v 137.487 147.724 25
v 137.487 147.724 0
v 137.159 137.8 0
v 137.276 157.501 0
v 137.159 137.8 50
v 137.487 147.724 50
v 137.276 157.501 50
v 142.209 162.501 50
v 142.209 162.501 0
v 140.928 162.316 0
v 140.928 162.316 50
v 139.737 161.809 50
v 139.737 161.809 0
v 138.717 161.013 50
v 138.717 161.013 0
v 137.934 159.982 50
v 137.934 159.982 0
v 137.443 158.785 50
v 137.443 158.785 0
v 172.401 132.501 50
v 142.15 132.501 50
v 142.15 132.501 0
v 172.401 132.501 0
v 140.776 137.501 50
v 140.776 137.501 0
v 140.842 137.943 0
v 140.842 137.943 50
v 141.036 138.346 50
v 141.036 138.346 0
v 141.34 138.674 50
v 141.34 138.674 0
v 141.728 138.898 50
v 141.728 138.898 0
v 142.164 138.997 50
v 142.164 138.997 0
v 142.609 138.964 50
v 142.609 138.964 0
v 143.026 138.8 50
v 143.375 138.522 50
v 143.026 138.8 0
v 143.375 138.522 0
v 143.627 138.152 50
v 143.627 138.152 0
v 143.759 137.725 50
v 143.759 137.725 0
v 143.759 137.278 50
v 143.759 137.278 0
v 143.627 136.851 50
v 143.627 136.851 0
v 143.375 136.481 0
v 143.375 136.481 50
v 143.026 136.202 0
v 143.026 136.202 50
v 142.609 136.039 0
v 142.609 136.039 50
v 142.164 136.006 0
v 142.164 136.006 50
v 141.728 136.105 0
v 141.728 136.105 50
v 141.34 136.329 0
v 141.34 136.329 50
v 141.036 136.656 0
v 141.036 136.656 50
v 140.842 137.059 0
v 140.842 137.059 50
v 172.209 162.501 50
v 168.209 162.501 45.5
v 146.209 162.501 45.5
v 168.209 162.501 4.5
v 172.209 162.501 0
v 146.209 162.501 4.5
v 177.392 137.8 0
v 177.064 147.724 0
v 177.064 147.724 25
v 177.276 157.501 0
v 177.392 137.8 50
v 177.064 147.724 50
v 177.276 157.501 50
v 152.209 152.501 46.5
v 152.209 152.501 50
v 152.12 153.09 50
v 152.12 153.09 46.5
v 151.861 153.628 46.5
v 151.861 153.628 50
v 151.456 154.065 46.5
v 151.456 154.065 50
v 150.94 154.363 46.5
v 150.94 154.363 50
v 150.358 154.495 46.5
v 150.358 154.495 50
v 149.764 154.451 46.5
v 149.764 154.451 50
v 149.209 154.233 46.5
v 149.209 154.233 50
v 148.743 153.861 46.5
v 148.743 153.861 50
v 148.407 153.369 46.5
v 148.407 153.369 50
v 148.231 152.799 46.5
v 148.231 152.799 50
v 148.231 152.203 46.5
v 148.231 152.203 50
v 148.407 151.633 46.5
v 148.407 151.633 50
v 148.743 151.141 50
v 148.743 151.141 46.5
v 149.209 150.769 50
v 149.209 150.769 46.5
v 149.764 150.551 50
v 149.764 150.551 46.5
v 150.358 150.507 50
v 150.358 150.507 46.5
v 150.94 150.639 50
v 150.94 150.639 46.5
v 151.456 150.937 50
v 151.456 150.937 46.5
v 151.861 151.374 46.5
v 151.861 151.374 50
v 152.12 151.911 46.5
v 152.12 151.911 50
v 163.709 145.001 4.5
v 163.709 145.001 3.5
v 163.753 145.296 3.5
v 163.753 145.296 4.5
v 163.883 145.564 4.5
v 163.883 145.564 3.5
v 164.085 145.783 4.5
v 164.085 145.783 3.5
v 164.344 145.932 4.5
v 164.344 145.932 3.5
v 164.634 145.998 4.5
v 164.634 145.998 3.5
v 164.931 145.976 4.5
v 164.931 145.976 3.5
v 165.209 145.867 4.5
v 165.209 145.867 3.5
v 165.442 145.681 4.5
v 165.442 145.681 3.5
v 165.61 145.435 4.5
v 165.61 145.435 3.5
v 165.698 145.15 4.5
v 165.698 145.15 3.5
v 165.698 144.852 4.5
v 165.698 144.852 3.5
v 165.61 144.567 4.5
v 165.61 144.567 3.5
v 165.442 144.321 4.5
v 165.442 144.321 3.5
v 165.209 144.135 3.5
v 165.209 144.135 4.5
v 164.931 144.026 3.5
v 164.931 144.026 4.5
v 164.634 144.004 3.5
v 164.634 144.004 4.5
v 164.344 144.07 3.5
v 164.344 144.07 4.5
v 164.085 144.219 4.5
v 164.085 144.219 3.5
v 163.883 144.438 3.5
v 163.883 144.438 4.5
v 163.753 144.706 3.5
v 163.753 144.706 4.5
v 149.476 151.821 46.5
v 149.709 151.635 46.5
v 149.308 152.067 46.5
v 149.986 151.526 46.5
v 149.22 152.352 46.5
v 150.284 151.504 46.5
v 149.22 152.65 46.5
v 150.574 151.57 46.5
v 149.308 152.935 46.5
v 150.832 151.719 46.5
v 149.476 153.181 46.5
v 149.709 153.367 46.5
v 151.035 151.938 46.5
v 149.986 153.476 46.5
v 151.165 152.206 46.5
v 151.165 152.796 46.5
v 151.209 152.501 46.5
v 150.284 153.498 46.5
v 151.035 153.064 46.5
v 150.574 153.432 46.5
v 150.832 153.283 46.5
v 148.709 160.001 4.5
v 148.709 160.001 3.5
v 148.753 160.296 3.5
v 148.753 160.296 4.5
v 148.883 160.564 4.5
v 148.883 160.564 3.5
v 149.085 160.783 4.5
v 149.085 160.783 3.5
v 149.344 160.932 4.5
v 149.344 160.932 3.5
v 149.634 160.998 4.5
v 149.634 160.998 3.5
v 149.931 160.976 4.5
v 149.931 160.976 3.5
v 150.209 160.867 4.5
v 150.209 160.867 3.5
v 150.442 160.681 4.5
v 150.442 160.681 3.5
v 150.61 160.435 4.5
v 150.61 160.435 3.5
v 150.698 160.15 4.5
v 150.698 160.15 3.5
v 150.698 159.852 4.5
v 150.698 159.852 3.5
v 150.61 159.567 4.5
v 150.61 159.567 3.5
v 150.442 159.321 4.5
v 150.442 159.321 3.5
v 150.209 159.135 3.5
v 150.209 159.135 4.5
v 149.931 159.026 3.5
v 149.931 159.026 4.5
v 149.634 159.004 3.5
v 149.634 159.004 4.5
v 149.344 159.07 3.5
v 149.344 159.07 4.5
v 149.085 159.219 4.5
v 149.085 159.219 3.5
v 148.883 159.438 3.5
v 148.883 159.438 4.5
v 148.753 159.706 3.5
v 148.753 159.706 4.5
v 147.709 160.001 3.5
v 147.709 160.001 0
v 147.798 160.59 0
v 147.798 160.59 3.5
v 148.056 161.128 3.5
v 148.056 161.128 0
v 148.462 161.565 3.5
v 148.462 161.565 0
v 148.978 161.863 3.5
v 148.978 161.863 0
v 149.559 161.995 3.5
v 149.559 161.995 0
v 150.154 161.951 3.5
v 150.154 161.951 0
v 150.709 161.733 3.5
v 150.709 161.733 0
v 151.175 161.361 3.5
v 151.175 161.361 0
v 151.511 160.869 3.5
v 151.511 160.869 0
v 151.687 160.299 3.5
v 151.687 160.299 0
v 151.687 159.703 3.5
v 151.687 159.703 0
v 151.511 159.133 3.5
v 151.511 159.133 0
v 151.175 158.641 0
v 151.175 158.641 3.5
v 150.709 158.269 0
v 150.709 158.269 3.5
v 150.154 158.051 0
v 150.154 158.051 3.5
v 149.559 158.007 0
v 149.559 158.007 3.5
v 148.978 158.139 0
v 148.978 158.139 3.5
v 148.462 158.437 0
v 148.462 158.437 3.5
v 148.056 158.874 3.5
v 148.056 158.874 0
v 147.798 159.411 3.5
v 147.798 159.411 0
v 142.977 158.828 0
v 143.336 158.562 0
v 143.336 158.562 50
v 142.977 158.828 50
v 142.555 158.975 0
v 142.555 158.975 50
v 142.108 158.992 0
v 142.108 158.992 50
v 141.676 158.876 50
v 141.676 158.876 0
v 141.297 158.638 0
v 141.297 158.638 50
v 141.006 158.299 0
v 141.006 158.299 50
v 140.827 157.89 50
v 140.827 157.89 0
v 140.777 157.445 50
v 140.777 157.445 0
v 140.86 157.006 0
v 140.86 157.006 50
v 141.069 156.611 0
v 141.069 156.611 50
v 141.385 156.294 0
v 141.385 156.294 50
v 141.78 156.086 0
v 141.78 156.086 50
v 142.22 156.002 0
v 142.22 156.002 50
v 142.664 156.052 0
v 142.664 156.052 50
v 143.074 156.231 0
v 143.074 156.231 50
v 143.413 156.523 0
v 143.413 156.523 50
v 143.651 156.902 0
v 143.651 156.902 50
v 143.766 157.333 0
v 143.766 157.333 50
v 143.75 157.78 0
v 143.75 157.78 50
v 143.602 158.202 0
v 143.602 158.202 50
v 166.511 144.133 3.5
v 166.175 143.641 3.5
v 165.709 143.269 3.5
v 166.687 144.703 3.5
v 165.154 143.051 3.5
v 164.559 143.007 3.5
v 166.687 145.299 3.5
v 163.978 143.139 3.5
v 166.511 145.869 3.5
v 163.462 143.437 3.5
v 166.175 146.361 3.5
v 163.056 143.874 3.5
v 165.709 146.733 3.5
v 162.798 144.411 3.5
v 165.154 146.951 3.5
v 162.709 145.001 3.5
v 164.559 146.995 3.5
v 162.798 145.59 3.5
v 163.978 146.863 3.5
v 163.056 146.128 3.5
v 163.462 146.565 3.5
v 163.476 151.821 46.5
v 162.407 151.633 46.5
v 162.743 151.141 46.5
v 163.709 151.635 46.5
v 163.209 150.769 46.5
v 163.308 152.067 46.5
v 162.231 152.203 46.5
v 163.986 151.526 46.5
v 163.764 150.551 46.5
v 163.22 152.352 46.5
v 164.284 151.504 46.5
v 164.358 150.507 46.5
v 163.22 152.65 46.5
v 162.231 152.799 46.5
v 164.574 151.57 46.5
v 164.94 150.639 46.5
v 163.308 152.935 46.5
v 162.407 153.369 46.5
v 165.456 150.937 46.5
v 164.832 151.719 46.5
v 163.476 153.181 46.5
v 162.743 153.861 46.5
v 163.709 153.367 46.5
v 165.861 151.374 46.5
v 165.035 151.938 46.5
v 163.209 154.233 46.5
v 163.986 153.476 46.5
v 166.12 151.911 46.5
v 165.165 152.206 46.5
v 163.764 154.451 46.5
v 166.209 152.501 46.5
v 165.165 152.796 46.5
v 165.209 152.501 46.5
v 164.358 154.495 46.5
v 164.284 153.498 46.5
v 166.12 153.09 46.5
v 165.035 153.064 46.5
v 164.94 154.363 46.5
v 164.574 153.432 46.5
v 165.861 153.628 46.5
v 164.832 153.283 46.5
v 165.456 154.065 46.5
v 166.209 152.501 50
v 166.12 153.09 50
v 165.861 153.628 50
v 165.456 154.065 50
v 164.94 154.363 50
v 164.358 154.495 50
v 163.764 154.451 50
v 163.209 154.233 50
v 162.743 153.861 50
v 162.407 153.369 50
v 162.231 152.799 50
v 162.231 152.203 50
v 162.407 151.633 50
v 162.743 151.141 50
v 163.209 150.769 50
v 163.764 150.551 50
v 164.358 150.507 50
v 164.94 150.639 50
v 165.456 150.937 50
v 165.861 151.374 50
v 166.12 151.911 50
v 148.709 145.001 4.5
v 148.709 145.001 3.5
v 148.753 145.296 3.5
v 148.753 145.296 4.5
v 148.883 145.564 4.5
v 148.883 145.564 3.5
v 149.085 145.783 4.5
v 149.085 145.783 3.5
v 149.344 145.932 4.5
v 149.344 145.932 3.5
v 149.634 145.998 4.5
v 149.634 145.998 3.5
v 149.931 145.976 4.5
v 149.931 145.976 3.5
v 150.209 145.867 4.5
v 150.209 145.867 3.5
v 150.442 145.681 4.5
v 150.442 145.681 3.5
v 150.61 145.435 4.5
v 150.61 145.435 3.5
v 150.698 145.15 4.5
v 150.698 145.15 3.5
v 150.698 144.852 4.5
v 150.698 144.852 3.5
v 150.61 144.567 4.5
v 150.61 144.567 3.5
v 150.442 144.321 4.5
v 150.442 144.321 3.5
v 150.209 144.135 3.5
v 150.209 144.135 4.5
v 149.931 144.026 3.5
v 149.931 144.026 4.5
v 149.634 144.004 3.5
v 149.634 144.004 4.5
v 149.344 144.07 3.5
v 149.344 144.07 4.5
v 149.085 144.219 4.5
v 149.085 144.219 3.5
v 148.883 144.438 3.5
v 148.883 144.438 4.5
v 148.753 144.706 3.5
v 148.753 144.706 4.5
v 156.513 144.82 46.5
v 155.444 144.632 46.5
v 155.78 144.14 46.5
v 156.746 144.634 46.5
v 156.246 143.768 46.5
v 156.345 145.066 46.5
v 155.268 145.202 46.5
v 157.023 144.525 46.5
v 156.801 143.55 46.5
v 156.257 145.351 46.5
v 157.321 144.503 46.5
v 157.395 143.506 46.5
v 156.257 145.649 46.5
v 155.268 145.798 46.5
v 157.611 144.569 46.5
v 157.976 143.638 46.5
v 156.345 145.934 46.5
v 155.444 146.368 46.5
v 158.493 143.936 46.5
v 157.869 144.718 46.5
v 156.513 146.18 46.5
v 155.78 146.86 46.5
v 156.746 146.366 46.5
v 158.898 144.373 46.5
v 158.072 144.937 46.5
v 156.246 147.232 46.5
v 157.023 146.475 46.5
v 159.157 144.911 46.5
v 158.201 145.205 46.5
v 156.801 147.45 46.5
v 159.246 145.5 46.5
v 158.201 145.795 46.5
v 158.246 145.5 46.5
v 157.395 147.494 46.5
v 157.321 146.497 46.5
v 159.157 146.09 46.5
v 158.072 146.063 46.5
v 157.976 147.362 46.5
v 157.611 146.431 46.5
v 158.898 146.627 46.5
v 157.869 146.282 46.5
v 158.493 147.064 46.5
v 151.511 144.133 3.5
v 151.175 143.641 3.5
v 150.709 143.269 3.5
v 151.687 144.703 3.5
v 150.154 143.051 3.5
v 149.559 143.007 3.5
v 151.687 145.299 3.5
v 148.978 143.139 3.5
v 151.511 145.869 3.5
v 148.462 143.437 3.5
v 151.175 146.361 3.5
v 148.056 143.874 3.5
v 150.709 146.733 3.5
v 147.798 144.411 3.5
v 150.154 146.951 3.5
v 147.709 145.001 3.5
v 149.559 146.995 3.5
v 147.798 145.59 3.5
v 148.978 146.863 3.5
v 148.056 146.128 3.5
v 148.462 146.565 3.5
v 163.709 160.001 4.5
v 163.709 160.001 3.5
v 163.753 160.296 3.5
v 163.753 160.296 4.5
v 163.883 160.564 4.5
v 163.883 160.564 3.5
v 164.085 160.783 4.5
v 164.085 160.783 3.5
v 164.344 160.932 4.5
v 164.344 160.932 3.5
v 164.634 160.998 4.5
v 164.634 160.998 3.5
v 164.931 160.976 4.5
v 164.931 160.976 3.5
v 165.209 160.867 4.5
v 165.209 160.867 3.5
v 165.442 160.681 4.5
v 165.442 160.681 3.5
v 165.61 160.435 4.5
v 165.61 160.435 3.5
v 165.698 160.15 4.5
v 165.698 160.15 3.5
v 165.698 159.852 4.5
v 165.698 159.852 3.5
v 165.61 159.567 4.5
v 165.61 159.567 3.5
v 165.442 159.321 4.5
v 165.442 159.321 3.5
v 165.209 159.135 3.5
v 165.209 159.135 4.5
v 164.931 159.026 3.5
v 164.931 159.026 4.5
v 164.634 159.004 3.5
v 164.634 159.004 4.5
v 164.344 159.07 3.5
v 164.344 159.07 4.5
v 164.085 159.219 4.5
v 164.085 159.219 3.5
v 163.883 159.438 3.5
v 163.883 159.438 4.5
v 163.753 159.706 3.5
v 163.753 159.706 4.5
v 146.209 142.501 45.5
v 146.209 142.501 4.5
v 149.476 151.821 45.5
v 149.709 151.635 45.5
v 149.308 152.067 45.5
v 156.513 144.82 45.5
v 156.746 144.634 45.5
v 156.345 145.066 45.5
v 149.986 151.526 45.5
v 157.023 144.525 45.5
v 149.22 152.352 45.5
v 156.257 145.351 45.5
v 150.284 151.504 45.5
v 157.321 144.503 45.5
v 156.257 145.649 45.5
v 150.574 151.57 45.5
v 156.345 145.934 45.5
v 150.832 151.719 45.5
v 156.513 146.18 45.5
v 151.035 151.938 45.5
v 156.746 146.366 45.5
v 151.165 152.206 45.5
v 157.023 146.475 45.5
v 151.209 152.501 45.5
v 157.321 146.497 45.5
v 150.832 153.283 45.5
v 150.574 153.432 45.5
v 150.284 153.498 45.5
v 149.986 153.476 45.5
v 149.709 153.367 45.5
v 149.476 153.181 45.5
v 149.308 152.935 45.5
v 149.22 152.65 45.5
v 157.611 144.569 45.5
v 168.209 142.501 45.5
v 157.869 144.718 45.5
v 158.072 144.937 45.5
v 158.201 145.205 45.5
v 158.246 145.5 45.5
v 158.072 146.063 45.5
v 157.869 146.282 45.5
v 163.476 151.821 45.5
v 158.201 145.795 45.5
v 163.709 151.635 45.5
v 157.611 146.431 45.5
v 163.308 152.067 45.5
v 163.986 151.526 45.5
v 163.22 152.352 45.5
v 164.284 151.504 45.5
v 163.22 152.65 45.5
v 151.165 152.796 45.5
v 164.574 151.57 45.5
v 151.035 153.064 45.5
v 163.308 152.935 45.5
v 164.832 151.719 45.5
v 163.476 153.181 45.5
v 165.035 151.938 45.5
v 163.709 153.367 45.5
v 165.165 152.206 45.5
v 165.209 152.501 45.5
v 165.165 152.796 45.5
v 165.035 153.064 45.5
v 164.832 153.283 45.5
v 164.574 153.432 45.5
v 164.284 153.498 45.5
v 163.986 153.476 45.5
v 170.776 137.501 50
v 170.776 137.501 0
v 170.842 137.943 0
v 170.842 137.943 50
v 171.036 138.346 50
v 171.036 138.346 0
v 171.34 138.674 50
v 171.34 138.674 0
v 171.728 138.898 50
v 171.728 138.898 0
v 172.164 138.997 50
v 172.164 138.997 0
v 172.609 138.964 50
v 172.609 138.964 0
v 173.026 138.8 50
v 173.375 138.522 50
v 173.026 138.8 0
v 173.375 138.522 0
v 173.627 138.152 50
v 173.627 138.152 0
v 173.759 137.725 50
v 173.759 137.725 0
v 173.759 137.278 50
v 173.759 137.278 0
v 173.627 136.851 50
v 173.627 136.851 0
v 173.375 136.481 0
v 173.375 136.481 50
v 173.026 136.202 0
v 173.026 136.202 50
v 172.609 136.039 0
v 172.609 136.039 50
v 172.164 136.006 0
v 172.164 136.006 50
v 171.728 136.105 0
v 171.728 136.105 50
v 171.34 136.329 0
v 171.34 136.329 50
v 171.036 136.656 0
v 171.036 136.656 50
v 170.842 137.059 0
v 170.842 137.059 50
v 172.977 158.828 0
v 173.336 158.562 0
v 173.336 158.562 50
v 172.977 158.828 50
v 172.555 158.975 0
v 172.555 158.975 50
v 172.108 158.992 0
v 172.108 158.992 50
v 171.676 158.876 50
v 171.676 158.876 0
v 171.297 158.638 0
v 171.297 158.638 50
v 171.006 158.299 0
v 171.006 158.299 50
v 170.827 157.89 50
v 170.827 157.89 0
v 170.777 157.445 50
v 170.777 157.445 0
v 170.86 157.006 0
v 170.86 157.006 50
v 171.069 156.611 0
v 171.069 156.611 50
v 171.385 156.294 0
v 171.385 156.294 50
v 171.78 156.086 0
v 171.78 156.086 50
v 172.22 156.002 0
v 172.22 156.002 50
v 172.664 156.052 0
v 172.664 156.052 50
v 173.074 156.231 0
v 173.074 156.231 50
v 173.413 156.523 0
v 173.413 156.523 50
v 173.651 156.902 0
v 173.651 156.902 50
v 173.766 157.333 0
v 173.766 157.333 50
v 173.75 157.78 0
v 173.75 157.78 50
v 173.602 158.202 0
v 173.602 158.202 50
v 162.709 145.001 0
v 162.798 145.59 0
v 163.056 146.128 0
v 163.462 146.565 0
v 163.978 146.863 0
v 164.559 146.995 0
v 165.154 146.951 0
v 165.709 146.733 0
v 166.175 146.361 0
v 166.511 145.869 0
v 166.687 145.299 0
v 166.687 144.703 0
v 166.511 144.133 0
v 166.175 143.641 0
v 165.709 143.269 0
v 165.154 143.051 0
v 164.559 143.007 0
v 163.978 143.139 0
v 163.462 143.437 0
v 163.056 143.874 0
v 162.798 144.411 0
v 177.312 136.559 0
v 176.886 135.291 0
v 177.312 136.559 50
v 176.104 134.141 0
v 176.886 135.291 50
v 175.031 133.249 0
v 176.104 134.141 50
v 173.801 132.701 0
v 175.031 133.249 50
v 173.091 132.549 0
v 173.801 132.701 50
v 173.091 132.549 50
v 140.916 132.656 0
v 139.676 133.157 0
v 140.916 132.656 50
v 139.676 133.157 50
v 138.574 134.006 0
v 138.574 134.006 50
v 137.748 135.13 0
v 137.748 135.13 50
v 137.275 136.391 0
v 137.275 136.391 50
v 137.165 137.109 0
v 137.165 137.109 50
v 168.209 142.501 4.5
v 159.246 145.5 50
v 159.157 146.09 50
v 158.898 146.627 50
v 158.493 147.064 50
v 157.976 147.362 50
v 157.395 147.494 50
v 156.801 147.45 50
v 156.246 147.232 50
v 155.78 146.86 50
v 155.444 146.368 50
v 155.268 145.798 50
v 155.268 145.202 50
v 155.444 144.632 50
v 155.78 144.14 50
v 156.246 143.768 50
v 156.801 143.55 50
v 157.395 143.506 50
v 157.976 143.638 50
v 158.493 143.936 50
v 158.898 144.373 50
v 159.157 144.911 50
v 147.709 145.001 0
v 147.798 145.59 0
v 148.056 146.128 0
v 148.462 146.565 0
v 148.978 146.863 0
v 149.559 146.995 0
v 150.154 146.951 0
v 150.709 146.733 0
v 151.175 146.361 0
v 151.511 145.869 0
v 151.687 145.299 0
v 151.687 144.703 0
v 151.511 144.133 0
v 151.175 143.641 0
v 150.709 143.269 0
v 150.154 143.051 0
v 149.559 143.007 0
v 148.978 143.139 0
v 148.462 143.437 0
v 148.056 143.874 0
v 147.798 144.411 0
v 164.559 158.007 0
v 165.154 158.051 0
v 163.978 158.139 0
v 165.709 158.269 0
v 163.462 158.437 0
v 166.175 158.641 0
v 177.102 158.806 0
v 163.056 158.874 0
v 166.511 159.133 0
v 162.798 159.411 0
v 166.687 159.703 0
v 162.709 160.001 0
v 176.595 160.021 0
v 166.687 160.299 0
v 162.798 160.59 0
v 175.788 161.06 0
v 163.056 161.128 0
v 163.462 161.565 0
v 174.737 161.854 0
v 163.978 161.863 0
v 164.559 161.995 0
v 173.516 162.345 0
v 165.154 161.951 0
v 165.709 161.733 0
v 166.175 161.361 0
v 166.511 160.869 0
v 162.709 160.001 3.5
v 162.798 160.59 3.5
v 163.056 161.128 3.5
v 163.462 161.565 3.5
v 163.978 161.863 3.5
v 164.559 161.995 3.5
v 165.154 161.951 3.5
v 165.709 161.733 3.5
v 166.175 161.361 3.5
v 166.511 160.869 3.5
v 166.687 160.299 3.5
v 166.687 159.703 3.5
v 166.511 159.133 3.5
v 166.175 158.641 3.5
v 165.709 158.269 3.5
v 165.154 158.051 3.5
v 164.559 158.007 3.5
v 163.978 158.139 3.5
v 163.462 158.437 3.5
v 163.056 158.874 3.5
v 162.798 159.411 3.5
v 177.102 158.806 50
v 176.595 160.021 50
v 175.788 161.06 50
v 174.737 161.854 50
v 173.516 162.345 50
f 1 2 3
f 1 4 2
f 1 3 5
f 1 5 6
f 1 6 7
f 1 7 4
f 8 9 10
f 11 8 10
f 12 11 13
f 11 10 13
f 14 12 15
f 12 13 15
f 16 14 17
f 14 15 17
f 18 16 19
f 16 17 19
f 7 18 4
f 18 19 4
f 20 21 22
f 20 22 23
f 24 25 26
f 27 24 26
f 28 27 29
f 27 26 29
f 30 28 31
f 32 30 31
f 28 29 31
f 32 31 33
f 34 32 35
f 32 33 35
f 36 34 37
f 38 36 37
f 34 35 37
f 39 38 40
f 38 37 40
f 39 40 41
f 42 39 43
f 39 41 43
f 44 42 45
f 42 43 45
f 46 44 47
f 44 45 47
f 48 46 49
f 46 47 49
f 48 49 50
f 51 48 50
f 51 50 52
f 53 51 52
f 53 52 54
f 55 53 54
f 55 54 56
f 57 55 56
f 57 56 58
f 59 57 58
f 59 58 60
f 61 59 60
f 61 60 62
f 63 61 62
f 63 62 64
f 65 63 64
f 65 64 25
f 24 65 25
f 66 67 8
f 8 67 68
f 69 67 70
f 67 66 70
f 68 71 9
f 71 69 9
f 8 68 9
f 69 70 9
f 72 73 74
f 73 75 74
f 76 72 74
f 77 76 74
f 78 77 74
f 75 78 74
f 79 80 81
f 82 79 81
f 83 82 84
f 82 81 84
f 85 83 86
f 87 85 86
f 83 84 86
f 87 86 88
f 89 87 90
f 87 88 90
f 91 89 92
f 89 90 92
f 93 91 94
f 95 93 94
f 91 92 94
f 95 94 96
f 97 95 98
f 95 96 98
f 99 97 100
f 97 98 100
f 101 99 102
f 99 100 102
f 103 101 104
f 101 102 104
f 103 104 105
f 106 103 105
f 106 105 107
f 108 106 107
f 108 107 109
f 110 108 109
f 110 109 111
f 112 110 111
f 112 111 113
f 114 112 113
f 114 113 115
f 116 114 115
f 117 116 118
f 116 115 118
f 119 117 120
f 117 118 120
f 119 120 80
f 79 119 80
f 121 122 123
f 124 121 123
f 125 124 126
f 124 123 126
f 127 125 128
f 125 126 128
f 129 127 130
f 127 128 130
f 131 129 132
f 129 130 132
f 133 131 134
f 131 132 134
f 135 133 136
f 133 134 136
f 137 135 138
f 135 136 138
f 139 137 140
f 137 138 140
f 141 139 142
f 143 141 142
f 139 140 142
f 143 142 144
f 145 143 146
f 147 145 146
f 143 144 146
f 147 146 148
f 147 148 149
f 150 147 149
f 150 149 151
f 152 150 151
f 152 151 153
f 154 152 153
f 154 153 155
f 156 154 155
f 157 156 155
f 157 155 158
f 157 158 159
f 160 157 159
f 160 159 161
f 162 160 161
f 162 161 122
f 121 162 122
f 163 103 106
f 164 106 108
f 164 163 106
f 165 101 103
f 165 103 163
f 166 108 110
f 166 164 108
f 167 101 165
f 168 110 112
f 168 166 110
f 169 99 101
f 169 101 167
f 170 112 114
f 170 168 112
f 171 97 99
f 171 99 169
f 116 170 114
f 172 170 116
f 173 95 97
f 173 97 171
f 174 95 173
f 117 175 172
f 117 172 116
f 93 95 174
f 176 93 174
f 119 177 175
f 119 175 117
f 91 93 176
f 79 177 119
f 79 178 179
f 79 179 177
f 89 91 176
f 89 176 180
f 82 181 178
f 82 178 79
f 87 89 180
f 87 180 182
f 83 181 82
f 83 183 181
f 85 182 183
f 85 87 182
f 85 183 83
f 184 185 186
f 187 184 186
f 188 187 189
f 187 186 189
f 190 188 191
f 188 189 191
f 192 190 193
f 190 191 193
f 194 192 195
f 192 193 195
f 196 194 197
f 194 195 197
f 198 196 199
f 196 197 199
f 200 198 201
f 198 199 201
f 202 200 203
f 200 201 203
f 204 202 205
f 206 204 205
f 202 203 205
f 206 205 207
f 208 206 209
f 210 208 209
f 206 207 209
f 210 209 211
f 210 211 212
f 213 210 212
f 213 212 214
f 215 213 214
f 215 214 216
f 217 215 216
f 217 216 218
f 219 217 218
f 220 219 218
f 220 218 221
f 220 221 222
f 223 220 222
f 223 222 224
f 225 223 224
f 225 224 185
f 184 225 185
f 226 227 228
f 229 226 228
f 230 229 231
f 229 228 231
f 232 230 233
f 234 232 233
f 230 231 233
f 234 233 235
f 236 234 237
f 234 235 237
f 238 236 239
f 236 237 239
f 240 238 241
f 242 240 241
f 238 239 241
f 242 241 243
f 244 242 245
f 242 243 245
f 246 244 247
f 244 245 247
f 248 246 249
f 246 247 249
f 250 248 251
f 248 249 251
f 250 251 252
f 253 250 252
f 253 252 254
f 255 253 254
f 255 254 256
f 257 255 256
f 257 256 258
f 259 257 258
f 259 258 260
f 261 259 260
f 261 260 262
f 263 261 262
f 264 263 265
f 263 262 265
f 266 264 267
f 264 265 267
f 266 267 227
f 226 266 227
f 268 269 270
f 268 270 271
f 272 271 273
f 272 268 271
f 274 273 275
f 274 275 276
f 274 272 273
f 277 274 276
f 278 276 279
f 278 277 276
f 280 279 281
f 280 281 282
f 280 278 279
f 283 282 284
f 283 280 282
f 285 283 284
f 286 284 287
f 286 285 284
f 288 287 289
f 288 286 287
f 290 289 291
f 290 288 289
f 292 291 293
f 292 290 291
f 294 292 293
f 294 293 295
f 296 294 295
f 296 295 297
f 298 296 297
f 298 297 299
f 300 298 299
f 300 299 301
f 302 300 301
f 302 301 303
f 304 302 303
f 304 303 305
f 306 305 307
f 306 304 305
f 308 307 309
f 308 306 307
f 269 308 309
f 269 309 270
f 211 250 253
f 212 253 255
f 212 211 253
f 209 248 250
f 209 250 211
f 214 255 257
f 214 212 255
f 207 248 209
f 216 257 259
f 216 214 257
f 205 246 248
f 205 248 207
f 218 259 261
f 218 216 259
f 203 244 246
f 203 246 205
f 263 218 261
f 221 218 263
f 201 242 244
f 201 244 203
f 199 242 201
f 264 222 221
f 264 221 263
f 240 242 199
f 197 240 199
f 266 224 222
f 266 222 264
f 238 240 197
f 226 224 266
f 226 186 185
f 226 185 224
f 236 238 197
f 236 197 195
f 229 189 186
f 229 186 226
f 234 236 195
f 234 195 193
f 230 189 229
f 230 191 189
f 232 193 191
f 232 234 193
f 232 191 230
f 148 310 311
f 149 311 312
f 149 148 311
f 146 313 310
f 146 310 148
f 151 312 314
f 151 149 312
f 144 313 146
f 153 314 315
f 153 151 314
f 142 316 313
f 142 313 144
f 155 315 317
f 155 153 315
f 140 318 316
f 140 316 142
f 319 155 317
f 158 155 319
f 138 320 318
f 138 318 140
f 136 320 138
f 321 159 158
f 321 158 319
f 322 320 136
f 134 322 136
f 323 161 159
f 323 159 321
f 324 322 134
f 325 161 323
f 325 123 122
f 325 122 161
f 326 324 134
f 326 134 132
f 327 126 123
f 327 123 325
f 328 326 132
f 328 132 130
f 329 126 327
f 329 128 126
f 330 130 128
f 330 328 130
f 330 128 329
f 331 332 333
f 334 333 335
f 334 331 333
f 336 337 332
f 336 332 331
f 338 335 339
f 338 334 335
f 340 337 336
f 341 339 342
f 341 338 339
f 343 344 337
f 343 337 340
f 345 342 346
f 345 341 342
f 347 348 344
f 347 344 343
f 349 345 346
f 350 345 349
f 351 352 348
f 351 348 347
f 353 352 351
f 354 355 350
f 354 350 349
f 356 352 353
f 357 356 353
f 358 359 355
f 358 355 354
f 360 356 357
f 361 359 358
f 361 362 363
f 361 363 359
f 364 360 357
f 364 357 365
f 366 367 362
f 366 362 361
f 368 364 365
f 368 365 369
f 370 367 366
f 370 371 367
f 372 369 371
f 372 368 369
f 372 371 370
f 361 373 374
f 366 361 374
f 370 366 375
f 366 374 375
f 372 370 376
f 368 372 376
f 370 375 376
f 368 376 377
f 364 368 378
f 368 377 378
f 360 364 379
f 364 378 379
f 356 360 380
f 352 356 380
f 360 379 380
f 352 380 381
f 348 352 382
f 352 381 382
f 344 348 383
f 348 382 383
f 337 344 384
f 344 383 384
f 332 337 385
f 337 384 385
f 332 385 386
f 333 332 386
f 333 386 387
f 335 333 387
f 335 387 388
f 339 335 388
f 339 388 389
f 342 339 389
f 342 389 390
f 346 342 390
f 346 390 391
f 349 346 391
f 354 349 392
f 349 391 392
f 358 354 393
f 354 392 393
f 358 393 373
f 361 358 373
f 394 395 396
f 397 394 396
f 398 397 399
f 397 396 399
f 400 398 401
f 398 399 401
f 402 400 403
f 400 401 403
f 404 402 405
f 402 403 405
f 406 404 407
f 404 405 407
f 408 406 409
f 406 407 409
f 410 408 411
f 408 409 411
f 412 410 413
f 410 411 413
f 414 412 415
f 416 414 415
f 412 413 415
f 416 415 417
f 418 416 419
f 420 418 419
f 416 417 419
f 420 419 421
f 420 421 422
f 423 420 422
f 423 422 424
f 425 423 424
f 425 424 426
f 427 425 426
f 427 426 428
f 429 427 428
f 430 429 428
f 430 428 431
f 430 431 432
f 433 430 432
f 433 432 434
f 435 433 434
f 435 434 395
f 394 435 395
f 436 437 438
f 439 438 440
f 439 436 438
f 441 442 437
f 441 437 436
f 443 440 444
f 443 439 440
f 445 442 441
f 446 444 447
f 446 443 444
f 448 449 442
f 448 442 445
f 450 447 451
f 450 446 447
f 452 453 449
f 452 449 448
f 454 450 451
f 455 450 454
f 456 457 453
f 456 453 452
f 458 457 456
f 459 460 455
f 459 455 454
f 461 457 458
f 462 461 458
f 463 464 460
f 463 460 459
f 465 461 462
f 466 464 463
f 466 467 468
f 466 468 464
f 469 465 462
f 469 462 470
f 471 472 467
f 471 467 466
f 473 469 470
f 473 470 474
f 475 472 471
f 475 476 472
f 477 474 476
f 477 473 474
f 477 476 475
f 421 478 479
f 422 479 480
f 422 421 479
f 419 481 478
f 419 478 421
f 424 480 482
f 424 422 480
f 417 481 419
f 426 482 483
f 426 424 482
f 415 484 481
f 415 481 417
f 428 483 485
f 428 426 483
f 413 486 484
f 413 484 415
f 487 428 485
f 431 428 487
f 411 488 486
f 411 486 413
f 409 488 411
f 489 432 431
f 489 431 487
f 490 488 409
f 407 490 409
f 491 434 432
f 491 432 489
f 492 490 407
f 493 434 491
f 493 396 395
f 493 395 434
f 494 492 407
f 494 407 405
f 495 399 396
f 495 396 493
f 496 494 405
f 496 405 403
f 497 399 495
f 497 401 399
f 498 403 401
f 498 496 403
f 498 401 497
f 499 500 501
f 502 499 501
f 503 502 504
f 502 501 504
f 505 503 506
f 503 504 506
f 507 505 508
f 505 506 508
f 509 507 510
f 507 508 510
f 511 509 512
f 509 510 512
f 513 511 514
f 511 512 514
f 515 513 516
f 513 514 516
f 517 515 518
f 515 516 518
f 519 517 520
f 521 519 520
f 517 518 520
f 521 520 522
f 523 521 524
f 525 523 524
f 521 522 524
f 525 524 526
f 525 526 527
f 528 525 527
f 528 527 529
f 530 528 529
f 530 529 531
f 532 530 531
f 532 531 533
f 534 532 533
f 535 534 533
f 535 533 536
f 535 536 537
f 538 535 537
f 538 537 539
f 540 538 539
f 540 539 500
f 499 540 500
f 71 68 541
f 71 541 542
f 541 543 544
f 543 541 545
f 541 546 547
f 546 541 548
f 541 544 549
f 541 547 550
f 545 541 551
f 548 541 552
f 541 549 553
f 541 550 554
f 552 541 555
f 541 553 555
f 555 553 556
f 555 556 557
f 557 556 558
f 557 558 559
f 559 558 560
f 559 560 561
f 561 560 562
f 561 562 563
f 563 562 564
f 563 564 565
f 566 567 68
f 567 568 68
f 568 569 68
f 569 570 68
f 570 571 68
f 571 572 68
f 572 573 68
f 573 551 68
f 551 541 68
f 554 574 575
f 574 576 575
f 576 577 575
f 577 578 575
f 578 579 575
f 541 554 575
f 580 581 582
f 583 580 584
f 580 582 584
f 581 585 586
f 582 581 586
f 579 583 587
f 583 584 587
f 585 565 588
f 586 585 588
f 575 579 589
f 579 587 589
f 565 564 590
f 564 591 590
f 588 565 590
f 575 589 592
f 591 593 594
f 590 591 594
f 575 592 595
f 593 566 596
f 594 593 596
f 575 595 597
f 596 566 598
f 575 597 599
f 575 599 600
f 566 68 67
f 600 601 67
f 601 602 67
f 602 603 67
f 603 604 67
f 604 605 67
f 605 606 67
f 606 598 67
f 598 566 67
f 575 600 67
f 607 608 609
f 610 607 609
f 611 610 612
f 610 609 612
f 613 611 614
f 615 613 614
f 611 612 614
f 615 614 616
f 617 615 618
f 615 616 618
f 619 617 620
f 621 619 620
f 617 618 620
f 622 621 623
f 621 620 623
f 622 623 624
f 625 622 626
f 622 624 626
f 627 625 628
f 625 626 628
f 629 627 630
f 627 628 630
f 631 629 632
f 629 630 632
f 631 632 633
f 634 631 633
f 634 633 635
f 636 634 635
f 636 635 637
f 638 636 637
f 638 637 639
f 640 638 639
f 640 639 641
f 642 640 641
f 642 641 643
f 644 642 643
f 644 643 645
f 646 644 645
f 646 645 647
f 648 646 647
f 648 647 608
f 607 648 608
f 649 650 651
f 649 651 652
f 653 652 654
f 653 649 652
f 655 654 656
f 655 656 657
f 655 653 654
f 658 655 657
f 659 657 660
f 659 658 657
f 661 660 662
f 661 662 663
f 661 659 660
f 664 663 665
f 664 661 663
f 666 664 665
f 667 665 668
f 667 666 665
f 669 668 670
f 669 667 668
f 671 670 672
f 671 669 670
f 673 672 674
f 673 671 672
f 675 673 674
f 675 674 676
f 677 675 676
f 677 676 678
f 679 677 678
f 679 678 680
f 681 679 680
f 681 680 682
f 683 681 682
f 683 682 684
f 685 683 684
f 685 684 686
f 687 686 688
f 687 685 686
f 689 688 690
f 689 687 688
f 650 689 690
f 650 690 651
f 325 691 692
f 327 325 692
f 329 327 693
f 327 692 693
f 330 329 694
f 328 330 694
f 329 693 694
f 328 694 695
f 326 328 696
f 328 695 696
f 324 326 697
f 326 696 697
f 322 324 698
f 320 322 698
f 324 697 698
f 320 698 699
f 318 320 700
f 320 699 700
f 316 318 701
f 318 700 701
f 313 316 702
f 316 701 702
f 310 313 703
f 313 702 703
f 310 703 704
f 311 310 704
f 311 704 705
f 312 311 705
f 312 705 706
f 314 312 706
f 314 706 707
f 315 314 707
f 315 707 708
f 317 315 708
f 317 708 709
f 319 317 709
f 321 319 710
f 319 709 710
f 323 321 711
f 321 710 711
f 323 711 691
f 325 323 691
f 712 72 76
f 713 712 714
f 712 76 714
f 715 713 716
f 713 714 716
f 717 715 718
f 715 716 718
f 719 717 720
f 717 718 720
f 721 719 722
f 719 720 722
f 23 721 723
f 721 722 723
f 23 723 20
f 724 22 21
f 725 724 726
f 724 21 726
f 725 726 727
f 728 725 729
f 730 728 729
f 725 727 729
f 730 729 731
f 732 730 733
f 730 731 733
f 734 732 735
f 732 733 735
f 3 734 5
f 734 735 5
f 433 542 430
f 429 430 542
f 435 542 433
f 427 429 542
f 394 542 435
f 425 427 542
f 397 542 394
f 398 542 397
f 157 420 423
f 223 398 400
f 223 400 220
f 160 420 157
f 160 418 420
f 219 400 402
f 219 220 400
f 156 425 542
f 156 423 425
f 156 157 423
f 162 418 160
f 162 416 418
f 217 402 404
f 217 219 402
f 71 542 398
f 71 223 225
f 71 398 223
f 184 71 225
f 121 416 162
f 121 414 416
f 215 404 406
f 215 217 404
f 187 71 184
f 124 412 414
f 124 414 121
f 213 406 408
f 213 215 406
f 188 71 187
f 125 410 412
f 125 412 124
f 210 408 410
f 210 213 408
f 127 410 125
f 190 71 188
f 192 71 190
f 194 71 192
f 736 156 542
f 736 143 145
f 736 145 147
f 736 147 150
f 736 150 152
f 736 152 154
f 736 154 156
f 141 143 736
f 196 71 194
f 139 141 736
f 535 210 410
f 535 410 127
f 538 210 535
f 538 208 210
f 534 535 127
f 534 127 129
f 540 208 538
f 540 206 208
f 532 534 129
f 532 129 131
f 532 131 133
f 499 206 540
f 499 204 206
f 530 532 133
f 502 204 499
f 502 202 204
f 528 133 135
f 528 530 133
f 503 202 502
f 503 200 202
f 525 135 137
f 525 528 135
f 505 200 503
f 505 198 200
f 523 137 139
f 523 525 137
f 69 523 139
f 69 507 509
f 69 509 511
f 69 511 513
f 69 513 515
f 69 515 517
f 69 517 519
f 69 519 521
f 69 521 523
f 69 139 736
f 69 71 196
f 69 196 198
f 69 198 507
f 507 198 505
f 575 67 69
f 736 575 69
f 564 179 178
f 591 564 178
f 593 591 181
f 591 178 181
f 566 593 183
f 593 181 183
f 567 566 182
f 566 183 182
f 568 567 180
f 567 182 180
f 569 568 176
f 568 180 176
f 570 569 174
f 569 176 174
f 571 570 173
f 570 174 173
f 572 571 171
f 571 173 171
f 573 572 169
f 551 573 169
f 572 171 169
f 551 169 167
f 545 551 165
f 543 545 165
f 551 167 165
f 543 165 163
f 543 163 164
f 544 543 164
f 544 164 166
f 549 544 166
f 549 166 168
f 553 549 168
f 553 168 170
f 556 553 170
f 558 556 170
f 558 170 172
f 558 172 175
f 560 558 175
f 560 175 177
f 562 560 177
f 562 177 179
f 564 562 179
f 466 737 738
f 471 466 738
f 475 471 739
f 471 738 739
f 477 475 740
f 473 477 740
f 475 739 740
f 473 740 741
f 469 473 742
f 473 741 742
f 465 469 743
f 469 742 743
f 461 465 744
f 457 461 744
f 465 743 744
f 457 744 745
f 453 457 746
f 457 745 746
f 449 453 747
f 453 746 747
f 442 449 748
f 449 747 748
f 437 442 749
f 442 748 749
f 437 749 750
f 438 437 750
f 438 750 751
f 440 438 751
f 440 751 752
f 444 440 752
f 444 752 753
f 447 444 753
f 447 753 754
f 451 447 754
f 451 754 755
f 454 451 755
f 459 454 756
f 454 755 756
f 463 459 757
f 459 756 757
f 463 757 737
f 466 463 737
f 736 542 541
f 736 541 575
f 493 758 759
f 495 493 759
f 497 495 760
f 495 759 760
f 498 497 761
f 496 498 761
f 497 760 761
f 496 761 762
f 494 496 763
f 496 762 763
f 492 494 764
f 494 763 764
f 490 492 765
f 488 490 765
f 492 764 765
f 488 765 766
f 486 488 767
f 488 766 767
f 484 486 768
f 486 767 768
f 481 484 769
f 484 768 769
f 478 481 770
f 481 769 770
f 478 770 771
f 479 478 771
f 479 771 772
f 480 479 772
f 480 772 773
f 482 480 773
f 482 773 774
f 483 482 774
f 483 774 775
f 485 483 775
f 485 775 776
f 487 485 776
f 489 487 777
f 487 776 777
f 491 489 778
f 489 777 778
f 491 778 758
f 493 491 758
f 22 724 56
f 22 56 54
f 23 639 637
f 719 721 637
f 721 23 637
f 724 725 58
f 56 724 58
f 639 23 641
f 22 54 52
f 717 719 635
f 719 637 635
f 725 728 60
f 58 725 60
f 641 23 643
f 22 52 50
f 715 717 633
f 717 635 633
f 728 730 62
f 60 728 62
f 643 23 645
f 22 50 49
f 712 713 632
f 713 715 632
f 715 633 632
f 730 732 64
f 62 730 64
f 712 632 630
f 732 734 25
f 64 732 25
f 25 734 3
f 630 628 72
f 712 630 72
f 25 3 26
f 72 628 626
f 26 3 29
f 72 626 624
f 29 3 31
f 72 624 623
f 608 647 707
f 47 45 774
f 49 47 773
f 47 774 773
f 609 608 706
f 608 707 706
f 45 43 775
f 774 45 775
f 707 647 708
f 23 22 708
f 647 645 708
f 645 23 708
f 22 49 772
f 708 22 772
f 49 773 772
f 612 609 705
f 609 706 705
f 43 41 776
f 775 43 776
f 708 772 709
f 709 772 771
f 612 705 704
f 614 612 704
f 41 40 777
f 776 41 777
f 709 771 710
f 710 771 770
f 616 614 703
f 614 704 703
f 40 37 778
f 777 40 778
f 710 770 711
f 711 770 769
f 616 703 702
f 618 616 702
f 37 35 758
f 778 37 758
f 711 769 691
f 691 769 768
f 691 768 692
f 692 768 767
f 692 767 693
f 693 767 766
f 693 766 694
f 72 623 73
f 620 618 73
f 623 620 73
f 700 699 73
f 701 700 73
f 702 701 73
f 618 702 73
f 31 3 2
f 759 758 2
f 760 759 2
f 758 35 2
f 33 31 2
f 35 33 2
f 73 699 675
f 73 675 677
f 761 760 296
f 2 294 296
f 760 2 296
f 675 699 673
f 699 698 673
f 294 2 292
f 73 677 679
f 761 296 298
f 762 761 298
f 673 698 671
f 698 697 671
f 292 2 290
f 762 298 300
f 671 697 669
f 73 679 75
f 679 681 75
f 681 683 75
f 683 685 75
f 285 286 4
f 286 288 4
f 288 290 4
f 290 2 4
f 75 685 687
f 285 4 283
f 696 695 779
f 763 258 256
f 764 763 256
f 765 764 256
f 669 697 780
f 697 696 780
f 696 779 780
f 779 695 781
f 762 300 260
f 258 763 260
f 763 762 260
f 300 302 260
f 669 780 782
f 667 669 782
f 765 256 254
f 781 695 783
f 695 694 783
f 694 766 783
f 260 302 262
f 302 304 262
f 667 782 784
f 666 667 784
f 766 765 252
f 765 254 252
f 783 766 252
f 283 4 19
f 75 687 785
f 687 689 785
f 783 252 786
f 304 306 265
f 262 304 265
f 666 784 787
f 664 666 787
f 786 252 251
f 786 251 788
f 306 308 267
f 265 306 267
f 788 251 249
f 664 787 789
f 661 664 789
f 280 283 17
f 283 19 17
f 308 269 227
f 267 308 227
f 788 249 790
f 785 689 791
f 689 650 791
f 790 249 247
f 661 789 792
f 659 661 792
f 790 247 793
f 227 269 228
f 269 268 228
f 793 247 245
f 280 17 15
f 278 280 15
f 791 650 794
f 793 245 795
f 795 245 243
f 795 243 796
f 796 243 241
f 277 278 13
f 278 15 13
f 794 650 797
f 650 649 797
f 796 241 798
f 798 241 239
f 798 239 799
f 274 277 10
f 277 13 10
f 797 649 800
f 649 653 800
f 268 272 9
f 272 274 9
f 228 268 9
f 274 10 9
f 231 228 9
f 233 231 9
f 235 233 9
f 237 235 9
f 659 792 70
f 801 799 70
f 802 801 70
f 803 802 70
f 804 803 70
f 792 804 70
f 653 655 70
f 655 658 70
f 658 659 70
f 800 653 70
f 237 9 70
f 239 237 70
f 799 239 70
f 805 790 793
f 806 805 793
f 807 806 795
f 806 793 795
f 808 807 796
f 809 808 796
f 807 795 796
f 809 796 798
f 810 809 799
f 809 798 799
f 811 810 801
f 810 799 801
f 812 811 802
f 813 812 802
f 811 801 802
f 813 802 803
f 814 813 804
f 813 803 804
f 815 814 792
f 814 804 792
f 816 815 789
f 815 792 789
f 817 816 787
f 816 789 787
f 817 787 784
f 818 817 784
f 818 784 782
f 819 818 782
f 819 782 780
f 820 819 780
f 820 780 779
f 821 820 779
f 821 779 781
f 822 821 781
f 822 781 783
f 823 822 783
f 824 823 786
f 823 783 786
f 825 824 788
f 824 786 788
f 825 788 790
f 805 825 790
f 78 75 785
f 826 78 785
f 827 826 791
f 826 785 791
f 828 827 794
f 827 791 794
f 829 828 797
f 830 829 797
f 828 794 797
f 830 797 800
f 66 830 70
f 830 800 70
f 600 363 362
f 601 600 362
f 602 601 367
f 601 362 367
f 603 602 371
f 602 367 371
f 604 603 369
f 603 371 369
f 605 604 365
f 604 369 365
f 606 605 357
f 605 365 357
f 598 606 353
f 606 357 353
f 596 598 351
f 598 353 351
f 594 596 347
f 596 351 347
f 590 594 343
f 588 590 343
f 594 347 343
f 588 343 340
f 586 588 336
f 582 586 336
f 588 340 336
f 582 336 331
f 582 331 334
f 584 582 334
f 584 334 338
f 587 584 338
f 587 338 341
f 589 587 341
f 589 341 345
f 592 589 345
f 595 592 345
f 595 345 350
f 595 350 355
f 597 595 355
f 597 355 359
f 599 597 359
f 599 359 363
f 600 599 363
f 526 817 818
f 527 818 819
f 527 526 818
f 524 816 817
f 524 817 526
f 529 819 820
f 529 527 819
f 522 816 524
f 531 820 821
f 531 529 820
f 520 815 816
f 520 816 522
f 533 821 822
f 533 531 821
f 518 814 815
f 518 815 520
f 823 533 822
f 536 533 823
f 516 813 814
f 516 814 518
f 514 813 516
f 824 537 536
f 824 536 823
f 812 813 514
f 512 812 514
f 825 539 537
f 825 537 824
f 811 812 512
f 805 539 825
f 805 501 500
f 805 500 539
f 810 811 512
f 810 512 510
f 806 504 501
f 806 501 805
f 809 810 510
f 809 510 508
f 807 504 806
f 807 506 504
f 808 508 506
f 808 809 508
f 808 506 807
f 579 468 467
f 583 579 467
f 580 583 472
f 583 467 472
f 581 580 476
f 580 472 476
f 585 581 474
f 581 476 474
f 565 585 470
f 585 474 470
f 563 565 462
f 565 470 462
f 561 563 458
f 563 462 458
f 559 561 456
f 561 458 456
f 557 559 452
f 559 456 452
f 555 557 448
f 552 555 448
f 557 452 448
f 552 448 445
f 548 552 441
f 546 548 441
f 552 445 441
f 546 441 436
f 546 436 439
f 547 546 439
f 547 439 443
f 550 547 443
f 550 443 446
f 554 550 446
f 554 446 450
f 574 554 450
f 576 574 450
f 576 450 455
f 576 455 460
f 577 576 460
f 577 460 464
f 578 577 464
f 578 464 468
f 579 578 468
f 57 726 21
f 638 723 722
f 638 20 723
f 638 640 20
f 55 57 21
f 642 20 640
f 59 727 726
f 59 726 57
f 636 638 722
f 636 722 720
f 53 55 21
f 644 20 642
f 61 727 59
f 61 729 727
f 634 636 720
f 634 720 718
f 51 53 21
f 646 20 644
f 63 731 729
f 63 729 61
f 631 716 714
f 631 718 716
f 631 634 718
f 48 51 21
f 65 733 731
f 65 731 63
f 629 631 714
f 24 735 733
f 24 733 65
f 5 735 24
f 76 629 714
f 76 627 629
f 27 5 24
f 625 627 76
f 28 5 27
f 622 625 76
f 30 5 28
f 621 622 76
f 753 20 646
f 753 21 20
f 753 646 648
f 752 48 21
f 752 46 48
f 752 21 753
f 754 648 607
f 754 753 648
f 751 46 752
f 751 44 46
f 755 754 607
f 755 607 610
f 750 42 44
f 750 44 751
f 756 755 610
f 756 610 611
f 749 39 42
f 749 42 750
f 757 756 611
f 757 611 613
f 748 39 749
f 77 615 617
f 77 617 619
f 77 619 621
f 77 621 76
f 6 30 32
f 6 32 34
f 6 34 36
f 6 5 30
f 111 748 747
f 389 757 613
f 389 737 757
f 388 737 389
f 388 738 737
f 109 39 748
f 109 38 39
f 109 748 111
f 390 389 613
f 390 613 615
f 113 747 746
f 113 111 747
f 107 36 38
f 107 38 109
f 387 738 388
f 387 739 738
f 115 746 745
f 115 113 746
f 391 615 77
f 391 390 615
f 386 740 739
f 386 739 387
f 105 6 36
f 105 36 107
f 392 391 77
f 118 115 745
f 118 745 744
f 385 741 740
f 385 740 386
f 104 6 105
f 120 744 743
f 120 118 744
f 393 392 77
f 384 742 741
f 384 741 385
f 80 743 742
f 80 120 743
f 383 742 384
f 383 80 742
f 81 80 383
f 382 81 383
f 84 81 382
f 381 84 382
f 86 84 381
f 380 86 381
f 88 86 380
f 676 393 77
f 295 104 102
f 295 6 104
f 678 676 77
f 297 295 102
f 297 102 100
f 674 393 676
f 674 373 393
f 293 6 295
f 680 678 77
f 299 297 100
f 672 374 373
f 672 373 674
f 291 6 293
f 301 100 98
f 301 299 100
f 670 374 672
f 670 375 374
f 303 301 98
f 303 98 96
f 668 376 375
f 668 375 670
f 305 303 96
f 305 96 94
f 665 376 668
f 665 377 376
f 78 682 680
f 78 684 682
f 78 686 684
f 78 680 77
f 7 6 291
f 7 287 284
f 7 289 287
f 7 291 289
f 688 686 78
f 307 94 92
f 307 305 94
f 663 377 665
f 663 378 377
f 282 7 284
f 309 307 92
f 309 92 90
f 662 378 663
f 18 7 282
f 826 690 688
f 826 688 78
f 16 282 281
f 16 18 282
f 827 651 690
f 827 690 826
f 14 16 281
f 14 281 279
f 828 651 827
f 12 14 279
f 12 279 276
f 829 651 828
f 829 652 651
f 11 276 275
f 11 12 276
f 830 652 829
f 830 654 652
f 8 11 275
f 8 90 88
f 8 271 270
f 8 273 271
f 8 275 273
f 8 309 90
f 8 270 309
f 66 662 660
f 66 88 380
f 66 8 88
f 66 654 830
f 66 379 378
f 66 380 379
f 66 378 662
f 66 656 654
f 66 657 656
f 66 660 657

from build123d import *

# Parameters (mm, degrees)
SKETCH1_R             = 1.5
BOSS_EXTRUDE2_DEPTH   = 50
BODY_MOVE_COPY1_ANGLE = 45
SKETCH2_W             = 22
SKETCH2_H             = 41
CUT_EXTRUDE1_DEPTH    = 20
CUT_EXTRUDE6_REACH    = 248.506
SKETCH4_R             = 1
SKETCH5_R             = 2
CUT_EXTRUDE7_DEPTH    = 3.5
CUT_EXTRUDE11_REACH   = 248.506
SKETCH7_R             = 1
SKETCH8_R             = 2
CUT_EXTRUDE12_DEPTH   = 3.5
SKETCH9_R             = 1.5
CUT_EXTRUDE13_DEPTH   = 247.505542905
CUT_EXTRUDE14_DEPTH   = 247.505542905
FILLET1_R             = 5


with BuildPart() as part:
    # Sketch1 → Boss-Extrude2 (new body)
    with BuildSketch(Plane.XY):
        with BuildLine():
            Line((182.281997607, 145.957424373), (161.068794171, 167.170627808))
            ThreePointArc((161.068794171, 167.170627808), (157.547403451, 168.588083689), (154.045255639, 167.12372906))
            add(Edge.make_bspline(
                [(130.757413054, 145.551615227), (143.638496584, 155.63010859), (154.045255639, 167.12372906)],
                knots=[0.85894257, 0.85894257, 0.85894257, 1, 1, 1], degree=2))
            Line((130.757413054, 145.551615227), (160.757413054, 115.551615227))
            add(Edge.make_bspline(
                [(160.757413054, 115.551615227), (170.835906417, 128.432698758), (182.329526886, 138.839457812)],
                knots=[0.85894257, 0.85894257, 0.85894257, 1, 1, 1], degree=2))
            ThreePointArc((182.329526886, 138.839457812), (183.793881516, 142.408377812), (182.281997607, 145.957424373))
        make_face()
        with Locations((157.580789545, 163.588195154)):
            Circle(SKETCH1_R, mode=Mode.SUBTRACT)
        with Locations((178.79399298, 142.374991718)):
            Circle(SKETCH1_R, mode=Mode.SUBTRACT)
    extrude(amount=BOSS_EXTRUDE2_DEPTH)


with BuildPart() as part_1:
    # Body-Move/Copy1: moved
    add(part.part.rotate(Axis((157.275703017, 142.069905191, 0), (0, 0, 1)), BODY_MOVE_COPY1_ANGLE))

    # Sketch2 → Cut-Extrude1 (cut)
    with BuildSketch(Plane(origin=(0, 162.500916843, 0), x_dir=(1, 0, 0), z_dir=(0, 1, 0))):
        with Locations((157.208932318, -25)):
            Rectangle(SKETCH2_W, SKETCH2_H)
    extrude(amount=-CUT_EXTRUDE1_DEPTH, mode=Mode.SUBTRACT)

    # Sketch4 → Cut-Extrude6 (cut, up to next)
    with BuildSketch(Plane.XY.offset(50), mode=Mode.PRIVATE) as cut_extrude6_sk1:
        with Locations((150.208932318, 152.500916843)):
            Circle(SKETCH4_R)
    cut_extrude6_tool1 = extrude(cut_extrude6_sk1.sketch, amount=-CUT_EXTRUDE6_REACH, mode=Mode.PRIVATE) & part_1.part
    # Sketch4 → Cut-Extrude6 (cut, up to next)
    with BuildSketch(Plane.XY.offset(50), mode=Mode.PRIVATE) as cut_extrude6_sk2:
        with Locations((164.208932318, 152.500916843)):
            Circle(SKETCH4_R)
    cut_extrude6_tool2 = extrude(cut_extrude6_sk2.sketch, amount=-CUT_EXTRUDE6_REACH, mode=Mode.PRIVATE) & part_1.part
    # Sketch4 → Cut-Extrude6 (cut, up to next)
    with BuildSketch(Plane.XY.offset(50), mode=Mode.PRIVATE) as cut_extrude6_sk3:
        with Locations((157.245778438, 145.500039202)):
            Circle(SKETCH4_R)
    cut_extrude6_tool3 = extrude(cut_extrude6_sk3.sketch, amount=-CUT_EXTRUDE6_REACH, mode=Mode.PRIVATE) & part_1.part
    add(cut_extrude6_tool1.solids().sort_by_distance((150.208932, 152.500917, 50))[0], mode=Mode.SUBTRACT)
    add(cut_extrude6_tool2.solids().sort_by_distance((164.208932, 152.500917, 50))[0], mode=Mode.SUBTRACT)
    add(cut_extrude6_tool3.solids().sort_by_distance((157.245778, 145.500039, 50))[0], mode=Mode.SUBTRACT)

    # Sketch5 → Cut-Extrude7 (cut)
    with BuildSketch(Plane.XY.offset(50)):
        with Locations((150.208932318, 152.500916843)):
            Circle(SKETCH5_R)
        with Locations((164.208932318, 152.500916843)):
            Circle(SKETCH5_R)
        with Locations((157.245778438, 145.500039202)):
            Circle(SKETCH5_R)
    extrude(amount=-CUT_EXTRUDE7_DEPTH, mode=Mode.SUBTRACT)

    # Sketch7 → Cut-Extrude11 (cut, up to next)
    with BuildSketch(Plane(origin=(0, 0, 0), x_dir=(-1, 0, 0), z_dir=(0, 0, -1)), mode=Mode.PRIVATE) as cut_extrude11_sk1:
        with Locations((-149.708932317, 160.000916845)):
            Circle(SKETCH7_R)
    cut_extrude11_tool1 = extrude(cut_extrude11_sk1.sketch, amount=-CUT_EXTRUDE11_REACH, mode=Mode.PRIVATE) & part_1.part
    # Sketch7 → Cut-Extrude11 (cut, up to next)
    with BuildSketch(Plane(origin=(0, 0, 0), x_dir=(-1, 0, 0), z_dir=(0, 0, -1)), mode=Mode.PRIVATE) as cut_extrude11_sk2:
        with Locations((-164.70893232, 160.000916845)):
            Circle(SKETCH7_R)
    cut_extrude11_tool2 = extrude(cut_extrude11_sk2.sketch, amount=-CUT_EXTRUDE11_REACH, mode=Mode.PRIVATE) & part_1.part
    # Sketch7 → Cut-Extrude11 (cut, up to next)
    with BuildSketch(Plane(origin=(0, 0, 0), x_dir=(-1, 0, 0), z_dir=(0, 0, -1)), mode=Mode.PRIVATE) as cut_extrude11_sk3:
        with Locations((-149.708932317, 145.000916842)):
            Circle(SKETCH7_R)
    cut_extrude11_tool3 = extrude(cut_extrude11_sk3.sketch, amount=-CUT_EXTRUDE11_REACH, mode=Mode.PRIVATE) & part_1.part
    # Sketch7 → Cut-Extrude11 (cut, up to next)
    with BuildSketch(Plane(origin=(0, 0, 0), x_dir=(-1, 0, 0), z_dir=(0, 0, -1)), mode=Mode.PRIVATE) as cut_extrude11_sk4:
        with Locations((-164.70893232, 145.000916842)):
            Circle(SKETCH7_R)
    cut_extrude11_tool4 = extrude(cut_extrude11_sk4.sketch, amount=-CUT_EXTRUDE11_REACH, mode=Mode.PRIVATE) & part_1.part
    add(cut_extrude11_tool1.solids().sort_by_distance((149.708932, 160.000917, 0))[0], mode=Mode.SUBTRACT)
    add(cut_extrude11_tool2.solids().sort_by_distance((164.708932, 160.000917, 0))[0], mode=Mode.SUBTRACT)
    add(cut_extrude11_tool3.solids().sort_by_distance((149.708932, 145.000917, 0))[0], mode=Mode.SUBTRACT)
    add(cut_extrude11_tool4.solids().sort_by_distance((164.708932, 145.000917, 0))[0], mode=Mode.SUBTRACT)

    # Sketch8 → Cut-Extrude12 (cut)
    with BuildSketch(Plane(origin=(0, 0, 0), x_dir=(-1, 0, 0), z_dir=(0, 0, -1))):
        with Locations((-164.70893232, 160.000916845)):
            Circle(SKETCH8_R)
        with Locations((-149.708932317, 160.000916845)):
            Circle(SKETCH8_R)
        with Locations((-149.708932317, 145.000916842)):
            Circle(SKETCH8_R)
        with Locations((-164.70893232, 145.000916842)):
            Circle(SKETCH8_R)
    extrude(amount=-CUT_EXTRUDE12_DEPTH, mode=Mode.SUBTRACT)

    # Sketch9 → Cut-Extrude13 (cut, through all)
    with BuildSketch(Plane(origin=(0, 0, 0), x_dir=(-1, 0, 0), z_dir=(0, 0, -1))):
        with Locations((-172.275703017, 137.501362696)):
            Circle(SKETCH9_R)
        with Locations((-142.275703017, 137.501362696)):
            Circle(SKETCH9_R)
    extrude(amount=-CUT_EXTRUDE13_DEPTH, mode=Mode.SUBTRACT)

    # Sketch10 → Cut-Extrude14 (cut, through all)
    with BuildSketch(Plane(origin=(0, 0, 0), x_dir=(-1, 0, 0), z_dir=(0, 0, -1))):
        with BuildLine():
            Line((-136.767866361, 132.501362696), (-177.783539673, 132.501362696))
            add(Edge.make_bspline(
                [(-177.783539673, 132.501362696), (-178.076738818, 129.157172087), (-178.488906453, 125.780583309)],
                knots=[0.970662354, 0.970662354, 0.970662354, 1, 1, 1], degree=2))
            Line((-178.488906453, 125.780583309), (-136.062499581, 125.780583309))
            add(Edge.make_bspline(
                [(-136.062499581, 125.780583309), (-136.474667216, 129.157172087), (-136.767866361, 132.501362696)],
                knots=[0.85894257, 0.85894257, 0.85894257, 0.888280216, 0.888280216, 0.888280216], degree=2))
        make_face()
    extrude(amount=-CUT_EXTRUDE14_DEPTH, mode=Mode.SUBTRACT)

    # Fillet1
    fillet1_edges = [part_1.edges().sort_by_distance(p)[0] for p in [
        (136.767866361, 132.501362696, 25),
        (177.783539673, 132.501362696, 25),
    ]]
    fillet(fillet1_edges, radius=FILLET1_R)


solid = part_1.part
